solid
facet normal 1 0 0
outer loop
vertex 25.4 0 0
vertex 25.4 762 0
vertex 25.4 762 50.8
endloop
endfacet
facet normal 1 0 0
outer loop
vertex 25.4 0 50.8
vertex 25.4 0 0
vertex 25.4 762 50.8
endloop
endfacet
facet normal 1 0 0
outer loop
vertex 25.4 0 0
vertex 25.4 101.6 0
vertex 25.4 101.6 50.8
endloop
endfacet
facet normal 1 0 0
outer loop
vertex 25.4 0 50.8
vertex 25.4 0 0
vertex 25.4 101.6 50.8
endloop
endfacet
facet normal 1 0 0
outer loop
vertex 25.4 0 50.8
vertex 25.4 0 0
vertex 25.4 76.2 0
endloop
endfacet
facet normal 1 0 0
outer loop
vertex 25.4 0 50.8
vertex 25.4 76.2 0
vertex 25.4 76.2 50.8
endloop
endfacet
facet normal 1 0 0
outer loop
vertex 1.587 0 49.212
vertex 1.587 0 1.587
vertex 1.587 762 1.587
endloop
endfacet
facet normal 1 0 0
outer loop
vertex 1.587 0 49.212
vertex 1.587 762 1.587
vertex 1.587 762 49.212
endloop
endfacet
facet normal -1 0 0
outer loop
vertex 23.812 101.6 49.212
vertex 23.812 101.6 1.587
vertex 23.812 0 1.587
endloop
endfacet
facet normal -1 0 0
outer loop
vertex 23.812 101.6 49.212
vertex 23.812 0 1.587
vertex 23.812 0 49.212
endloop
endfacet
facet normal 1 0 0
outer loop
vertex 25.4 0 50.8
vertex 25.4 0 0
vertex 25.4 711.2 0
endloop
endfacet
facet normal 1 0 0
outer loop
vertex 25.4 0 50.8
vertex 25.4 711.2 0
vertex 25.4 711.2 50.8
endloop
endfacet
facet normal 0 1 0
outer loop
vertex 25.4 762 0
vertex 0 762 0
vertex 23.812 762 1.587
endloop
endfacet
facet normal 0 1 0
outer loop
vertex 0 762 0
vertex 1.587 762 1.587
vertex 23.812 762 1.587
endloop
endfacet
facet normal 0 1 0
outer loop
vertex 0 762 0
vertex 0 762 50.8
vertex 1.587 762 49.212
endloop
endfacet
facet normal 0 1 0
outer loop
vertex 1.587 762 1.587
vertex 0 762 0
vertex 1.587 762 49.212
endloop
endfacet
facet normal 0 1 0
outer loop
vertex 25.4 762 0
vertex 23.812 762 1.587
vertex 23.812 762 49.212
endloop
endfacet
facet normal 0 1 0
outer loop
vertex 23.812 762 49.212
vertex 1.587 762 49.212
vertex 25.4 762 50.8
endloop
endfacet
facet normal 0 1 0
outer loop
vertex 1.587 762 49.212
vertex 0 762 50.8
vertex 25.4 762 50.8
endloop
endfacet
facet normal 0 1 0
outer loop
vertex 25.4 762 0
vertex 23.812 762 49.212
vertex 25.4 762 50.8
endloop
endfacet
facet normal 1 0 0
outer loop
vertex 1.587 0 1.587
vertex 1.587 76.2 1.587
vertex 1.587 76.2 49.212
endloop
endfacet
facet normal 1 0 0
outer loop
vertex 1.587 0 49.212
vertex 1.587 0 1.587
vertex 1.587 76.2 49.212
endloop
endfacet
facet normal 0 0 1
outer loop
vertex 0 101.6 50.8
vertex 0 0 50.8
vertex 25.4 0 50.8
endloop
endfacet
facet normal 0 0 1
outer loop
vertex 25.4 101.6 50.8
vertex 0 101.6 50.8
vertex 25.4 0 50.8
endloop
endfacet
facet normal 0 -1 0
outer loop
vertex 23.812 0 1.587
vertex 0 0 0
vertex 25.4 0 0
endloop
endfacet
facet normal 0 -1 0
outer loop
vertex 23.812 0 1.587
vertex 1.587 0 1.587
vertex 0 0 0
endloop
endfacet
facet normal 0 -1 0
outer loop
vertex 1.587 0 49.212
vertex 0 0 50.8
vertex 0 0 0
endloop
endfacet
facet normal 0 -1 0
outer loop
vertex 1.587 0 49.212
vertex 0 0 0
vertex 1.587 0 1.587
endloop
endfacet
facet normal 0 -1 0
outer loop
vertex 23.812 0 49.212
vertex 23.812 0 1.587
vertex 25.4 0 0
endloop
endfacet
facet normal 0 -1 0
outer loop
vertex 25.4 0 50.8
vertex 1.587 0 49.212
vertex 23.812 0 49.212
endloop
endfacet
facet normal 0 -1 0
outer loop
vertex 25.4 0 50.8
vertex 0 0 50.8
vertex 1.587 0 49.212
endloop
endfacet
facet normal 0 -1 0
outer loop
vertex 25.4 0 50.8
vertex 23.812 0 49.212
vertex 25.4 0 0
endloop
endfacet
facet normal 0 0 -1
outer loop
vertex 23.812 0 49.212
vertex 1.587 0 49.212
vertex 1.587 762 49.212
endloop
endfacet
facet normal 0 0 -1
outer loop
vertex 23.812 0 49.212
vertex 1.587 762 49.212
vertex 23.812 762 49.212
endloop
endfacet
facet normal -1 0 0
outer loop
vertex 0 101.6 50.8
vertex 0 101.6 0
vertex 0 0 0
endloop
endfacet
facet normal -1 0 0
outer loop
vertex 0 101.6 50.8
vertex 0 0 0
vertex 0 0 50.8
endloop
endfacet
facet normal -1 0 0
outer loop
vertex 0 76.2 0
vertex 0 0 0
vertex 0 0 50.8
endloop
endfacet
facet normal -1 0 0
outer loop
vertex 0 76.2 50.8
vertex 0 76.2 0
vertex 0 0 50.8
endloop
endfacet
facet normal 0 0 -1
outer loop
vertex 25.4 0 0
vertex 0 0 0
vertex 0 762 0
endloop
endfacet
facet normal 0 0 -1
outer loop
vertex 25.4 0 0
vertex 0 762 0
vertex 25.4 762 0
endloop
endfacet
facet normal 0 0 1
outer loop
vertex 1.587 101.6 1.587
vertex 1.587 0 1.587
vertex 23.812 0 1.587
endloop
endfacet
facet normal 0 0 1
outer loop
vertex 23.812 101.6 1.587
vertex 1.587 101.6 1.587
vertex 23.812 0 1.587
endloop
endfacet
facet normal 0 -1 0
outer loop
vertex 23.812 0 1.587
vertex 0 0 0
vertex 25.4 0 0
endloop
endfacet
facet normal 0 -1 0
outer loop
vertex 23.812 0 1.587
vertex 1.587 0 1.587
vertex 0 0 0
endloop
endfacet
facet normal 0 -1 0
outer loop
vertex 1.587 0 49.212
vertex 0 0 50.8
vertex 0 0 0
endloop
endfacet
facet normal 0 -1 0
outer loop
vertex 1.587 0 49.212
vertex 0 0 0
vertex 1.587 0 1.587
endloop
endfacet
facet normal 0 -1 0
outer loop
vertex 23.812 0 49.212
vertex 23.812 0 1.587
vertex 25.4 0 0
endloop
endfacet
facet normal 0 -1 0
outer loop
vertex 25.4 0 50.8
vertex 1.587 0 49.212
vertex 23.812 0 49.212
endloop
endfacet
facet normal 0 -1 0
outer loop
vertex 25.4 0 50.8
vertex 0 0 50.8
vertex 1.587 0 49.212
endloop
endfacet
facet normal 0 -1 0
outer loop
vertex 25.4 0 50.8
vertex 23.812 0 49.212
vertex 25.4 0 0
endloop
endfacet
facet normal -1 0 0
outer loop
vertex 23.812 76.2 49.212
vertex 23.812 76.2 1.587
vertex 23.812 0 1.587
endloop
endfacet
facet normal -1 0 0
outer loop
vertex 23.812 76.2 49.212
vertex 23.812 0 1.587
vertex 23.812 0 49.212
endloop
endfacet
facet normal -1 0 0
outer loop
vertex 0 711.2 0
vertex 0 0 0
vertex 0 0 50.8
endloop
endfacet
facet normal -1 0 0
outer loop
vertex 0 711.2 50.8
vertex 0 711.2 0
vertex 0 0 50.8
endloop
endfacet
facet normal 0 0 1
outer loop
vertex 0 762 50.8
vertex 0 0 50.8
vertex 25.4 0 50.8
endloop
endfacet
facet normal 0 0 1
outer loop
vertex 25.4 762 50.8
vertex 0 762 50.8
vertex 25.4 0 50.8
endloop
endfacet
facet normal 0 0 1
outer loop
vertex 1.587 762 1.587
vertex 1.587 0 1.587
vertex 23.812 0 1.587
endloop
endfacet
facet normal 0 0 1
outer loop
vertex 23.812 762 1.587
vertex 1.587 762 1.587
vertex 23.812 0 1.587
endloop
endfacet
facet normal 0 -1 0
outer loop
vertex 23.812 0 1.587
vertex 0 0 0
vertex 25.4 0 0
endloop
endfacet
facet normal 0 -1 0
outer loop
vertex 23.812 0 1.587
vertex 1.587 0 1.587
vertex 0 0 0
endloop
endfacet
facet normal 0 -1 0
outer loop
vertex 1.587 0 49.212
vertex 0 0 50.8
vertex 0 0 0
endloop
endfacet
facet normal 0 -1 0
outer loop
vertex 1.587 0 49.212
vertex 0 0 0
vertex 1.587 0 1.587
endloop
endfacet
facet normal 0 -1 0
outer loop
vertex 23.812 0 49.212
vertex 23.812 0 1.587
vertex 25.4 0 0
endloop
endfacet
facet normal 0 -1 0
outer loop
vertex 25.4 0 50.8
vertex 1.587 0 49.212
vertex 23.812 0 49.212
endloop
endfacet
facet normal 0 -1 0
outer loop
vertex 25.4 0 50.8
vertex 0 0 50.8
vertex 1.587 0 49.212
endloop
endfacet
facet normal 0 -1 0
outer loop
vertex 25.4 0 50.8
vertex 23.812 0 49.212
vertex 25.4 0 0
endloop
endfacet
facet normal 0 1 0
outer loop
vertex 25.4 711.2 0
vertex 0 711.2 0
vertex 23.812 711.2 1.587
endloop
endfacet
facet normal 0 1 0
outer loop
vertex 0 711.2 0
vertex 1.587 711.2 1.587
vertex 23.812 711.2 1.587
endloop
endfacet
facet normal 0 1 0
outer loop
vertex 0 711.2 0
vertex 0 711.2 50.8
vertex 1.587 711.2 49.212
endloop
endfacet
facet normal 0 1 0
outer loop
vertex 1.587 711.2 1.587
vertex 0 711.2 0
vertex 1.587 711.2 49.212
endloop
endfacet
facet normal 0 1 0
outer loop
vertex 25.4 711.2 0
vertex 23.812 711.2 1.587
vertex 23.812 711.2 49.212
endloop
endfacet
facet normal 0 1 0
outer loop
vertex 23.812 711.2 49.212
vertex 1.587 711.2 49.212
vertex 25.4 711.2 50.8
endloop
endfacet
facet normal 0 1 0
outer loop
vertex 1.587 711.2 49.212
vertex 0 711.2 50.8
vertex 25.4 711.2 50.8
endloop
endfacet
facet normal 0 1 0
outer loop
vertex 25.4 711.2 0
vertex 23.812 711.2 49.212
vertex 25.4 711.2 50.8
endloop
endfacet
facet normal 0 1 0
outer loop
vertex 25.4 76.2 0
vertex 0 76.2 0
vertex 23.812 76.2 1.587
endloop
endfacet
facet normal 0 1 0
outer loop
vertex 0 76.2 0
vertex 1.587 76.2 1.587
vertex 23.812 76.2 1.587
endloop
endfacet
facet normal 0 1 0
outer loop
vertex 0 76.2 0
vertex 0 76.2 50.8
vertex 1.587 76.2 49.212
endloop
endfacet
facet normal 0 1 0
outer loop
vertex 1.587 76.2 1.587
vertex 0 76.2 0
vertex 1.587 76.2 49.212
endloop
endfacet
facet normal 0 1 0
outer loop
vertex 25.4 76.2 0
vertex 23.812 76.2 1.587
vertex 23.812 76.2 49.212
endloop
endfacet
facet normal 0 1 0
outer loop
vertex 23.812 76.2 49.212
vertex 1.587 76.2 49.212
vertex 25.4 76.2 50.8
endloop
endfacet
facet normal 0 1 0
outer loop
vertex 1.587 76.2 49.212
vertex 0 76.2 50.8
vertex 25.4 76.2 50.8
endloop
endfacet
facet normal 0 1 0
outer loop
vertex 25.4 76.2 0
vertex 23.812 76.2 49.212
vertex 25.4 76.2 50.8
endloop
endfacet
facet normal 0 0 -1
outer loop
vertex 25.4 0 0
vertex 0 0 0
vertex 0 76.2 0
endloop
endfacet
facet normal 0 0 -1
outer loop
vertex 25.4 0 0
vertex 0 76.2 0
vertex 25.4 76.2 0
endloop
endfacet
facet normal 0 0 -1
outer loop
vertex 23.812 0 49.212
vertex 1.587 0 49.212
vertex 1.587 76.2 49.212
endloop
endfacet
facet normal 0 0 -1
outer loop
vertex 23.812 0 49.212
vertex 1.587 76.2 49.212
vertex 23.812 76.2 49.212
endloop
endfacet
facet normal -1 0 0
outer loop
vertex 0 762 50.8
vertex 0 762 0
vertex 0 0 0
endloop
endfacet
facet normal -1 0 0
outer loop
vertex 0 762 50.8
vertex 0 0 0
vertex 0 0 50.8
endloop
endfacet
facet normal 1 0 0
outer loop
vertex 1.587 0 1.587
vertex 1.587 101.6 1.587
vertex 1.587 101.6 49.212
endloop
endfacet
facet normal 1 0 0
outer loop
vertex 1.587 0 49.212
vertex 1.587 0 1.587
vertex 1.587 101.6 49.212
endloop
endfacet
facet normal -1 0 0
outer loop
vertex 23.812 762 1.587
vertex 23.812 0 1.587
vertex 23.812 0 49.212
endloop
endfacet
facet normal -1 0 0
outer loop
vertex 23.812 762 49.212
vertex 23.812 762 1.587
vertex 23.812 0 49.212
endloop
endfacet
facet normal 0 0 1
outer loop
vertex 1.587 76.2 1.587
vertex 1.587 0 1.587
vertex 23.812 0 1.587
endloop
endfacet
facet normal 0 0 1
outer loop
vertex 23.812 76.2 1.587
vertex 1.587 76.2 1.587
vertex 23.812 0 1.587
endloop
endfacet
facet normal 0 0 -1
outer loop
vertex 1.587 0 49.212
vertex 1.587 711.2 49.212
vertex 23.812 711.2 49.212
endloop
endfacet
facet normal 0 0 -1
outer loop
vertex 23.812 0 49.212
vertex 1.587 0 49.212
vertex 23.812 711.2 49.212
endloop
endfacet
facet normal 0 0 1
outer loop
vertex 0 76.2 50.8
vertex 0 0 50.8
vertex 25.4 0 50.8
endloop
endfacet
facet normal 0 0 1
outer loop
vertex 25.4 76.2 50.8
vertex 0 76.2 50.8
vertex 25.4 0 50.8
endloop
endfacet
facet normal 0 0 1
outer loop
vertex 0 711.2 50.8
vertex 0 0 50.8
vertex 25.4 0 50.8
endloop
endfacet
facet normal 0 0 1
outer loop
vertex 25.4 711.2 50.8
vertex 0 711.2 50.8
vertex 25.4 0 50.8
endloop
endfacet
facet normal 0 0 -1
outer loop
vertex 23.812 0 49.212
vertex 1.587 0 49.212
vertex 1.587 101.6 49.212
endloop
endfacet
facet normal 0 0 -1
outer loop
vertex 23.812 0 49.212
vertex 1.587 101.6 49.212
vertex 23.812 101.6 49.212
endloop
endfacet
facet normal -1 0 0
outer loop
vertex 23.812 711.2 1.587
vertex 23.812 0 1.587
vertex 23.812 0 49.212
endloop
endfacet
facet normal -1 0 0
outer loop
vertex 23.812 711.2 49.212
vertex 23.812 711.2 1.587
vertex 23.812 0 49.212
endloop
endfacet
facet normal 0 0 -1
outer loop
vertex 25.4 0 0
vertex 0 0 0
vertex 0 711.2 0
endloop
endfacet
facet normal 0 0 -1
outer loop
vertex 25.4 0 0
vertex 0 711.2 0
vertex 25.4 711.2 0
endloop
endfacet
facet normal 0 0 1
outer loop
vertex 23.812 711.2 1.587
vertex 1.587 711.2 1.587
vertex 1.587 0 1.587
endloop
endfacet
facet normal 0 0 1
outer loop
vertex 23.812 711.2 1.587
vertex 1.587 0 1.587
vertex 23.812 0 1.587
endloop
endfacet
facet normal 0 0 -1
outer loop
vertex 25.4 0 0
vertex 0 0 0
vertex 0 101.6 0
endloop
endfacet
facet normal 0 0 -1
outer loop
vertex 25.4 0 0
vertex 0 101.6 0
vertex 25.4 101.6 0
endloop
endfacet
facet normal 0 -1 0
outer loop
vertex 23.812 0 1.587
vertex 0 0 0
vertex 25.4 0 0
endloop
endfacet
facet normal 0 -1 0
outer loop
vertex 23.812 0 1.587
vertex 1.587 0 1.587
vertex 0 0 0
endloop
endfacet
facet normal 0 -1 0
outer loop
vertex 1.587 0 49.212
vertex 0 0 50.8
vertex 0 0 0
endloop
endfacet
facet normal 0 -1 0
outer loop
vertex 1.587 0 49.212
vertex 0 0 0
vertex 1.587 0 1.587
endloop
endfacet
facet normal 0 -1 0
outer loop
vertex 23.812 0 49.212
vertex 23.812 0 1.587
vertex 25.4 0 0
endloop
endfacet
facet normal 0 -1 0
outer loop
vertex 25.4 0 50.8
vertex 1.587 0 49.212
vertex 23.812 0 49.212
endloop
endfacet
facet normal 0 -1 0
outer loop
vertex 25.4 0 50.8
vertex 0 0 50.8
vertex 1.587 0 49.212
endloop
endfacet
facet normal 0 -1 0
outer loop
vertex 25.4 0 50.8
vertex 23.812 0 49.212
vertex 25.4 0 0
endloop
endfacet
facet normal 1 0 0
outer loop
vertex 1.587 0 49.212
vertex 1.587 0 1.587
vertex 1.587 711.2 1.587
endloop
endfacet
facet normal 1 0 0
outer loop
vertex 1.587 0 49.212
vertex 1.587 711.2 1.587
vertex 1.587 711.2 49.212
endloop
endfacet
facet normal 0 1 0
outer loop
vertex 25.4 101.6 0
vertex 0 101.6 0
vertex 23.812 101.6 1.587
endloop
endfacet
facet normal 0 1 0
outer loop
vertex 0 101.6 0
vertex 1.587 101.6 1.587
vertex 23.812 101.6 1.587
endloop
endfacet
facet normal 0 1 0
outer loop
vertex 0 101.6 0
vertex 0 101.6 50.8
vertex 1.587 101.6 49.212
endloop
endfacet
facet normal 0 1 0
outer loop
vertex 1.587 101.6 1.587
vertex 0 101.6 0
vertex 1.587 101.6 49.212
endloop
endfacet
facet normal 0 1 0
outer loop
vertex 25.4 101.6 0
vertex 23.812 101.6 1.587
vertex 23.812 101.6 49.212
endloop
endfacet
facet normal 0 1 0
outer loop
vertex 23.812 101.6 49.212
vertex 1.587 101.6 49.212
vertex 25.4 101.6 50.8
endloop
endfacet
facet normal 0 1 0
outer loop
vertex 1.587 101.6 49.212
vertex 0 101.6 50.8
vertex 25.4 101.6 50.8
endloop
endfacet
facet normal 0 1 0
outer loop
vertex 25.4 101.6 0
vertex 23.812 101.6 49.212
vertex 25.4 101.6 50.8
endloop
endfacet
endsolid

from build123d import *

# Parameters (mm, degrees)
F4_W     = 25.4
F4_H     = 50.8
F4_W_2   = 22.225
F4_H_2   = 47.625
F5_DEPTH = 762
F6_DEPTH = 711.2
F7_DEPTH = 76.2
F8_DEPTH = 101.6


with BuildPart() as f5:
    # F4 (on Front) → F5 (new body)
    with BuildSketch(Plane.XZ):
        with Locations((12.7, 25.4)):
            Rectangle(F4_W, F4_H)
        with Locations((12.7, 25.4)):
            Rectangle(F4_W_2, F4_H_2, mode=Mode.SUBTRACT)
    extrude(amount=-F5_DEPTH)


with BuildPart() as f6:
    # F4 (on Front) → F6 (new body)
    with BuildSketch(Plane.XZ):
        with Locations((12.7, 25.4)):
            Rectangle(F4_W, F4_H)
        with Locations((12.7, 25.4)):
            Rectangle(F4_W_2, F4_H_2, mode=Mode.SUBTRACT)
    extrude(amount=-F6_DEPTH)


with BuildPart() as f7:
    # F4 (on Front) → F7 (new body)
    with BuildSketch(Plane.XZ):
        with Locations((12.7, 25.4)):
            Rectangle(F4_W, F4_H)
        with Locations((12.7, 25.4)):
            Rectangle(F4_W_2, F4_H_2, mode=Mode.SUBTRACT)
    extrude(amount=-F7_DEPTH)


with BuildPart() as f8:
    # F4 (on Front) → F8 (new body)
    with BuildSketch(Plane.XZ):
        with Locations((12.7, 25.4)):
            Rectangle(F4_W, F4_H)
        with Locations((12.7, 25.4)):
            Rectangle(F4_W_2, F4_H_2, mode=Mode.SUBTRACT)
    extrude(amount=-F8_DEPTH)


solid = Compound([f5.part, f6.part, f7.part, f8.part])
